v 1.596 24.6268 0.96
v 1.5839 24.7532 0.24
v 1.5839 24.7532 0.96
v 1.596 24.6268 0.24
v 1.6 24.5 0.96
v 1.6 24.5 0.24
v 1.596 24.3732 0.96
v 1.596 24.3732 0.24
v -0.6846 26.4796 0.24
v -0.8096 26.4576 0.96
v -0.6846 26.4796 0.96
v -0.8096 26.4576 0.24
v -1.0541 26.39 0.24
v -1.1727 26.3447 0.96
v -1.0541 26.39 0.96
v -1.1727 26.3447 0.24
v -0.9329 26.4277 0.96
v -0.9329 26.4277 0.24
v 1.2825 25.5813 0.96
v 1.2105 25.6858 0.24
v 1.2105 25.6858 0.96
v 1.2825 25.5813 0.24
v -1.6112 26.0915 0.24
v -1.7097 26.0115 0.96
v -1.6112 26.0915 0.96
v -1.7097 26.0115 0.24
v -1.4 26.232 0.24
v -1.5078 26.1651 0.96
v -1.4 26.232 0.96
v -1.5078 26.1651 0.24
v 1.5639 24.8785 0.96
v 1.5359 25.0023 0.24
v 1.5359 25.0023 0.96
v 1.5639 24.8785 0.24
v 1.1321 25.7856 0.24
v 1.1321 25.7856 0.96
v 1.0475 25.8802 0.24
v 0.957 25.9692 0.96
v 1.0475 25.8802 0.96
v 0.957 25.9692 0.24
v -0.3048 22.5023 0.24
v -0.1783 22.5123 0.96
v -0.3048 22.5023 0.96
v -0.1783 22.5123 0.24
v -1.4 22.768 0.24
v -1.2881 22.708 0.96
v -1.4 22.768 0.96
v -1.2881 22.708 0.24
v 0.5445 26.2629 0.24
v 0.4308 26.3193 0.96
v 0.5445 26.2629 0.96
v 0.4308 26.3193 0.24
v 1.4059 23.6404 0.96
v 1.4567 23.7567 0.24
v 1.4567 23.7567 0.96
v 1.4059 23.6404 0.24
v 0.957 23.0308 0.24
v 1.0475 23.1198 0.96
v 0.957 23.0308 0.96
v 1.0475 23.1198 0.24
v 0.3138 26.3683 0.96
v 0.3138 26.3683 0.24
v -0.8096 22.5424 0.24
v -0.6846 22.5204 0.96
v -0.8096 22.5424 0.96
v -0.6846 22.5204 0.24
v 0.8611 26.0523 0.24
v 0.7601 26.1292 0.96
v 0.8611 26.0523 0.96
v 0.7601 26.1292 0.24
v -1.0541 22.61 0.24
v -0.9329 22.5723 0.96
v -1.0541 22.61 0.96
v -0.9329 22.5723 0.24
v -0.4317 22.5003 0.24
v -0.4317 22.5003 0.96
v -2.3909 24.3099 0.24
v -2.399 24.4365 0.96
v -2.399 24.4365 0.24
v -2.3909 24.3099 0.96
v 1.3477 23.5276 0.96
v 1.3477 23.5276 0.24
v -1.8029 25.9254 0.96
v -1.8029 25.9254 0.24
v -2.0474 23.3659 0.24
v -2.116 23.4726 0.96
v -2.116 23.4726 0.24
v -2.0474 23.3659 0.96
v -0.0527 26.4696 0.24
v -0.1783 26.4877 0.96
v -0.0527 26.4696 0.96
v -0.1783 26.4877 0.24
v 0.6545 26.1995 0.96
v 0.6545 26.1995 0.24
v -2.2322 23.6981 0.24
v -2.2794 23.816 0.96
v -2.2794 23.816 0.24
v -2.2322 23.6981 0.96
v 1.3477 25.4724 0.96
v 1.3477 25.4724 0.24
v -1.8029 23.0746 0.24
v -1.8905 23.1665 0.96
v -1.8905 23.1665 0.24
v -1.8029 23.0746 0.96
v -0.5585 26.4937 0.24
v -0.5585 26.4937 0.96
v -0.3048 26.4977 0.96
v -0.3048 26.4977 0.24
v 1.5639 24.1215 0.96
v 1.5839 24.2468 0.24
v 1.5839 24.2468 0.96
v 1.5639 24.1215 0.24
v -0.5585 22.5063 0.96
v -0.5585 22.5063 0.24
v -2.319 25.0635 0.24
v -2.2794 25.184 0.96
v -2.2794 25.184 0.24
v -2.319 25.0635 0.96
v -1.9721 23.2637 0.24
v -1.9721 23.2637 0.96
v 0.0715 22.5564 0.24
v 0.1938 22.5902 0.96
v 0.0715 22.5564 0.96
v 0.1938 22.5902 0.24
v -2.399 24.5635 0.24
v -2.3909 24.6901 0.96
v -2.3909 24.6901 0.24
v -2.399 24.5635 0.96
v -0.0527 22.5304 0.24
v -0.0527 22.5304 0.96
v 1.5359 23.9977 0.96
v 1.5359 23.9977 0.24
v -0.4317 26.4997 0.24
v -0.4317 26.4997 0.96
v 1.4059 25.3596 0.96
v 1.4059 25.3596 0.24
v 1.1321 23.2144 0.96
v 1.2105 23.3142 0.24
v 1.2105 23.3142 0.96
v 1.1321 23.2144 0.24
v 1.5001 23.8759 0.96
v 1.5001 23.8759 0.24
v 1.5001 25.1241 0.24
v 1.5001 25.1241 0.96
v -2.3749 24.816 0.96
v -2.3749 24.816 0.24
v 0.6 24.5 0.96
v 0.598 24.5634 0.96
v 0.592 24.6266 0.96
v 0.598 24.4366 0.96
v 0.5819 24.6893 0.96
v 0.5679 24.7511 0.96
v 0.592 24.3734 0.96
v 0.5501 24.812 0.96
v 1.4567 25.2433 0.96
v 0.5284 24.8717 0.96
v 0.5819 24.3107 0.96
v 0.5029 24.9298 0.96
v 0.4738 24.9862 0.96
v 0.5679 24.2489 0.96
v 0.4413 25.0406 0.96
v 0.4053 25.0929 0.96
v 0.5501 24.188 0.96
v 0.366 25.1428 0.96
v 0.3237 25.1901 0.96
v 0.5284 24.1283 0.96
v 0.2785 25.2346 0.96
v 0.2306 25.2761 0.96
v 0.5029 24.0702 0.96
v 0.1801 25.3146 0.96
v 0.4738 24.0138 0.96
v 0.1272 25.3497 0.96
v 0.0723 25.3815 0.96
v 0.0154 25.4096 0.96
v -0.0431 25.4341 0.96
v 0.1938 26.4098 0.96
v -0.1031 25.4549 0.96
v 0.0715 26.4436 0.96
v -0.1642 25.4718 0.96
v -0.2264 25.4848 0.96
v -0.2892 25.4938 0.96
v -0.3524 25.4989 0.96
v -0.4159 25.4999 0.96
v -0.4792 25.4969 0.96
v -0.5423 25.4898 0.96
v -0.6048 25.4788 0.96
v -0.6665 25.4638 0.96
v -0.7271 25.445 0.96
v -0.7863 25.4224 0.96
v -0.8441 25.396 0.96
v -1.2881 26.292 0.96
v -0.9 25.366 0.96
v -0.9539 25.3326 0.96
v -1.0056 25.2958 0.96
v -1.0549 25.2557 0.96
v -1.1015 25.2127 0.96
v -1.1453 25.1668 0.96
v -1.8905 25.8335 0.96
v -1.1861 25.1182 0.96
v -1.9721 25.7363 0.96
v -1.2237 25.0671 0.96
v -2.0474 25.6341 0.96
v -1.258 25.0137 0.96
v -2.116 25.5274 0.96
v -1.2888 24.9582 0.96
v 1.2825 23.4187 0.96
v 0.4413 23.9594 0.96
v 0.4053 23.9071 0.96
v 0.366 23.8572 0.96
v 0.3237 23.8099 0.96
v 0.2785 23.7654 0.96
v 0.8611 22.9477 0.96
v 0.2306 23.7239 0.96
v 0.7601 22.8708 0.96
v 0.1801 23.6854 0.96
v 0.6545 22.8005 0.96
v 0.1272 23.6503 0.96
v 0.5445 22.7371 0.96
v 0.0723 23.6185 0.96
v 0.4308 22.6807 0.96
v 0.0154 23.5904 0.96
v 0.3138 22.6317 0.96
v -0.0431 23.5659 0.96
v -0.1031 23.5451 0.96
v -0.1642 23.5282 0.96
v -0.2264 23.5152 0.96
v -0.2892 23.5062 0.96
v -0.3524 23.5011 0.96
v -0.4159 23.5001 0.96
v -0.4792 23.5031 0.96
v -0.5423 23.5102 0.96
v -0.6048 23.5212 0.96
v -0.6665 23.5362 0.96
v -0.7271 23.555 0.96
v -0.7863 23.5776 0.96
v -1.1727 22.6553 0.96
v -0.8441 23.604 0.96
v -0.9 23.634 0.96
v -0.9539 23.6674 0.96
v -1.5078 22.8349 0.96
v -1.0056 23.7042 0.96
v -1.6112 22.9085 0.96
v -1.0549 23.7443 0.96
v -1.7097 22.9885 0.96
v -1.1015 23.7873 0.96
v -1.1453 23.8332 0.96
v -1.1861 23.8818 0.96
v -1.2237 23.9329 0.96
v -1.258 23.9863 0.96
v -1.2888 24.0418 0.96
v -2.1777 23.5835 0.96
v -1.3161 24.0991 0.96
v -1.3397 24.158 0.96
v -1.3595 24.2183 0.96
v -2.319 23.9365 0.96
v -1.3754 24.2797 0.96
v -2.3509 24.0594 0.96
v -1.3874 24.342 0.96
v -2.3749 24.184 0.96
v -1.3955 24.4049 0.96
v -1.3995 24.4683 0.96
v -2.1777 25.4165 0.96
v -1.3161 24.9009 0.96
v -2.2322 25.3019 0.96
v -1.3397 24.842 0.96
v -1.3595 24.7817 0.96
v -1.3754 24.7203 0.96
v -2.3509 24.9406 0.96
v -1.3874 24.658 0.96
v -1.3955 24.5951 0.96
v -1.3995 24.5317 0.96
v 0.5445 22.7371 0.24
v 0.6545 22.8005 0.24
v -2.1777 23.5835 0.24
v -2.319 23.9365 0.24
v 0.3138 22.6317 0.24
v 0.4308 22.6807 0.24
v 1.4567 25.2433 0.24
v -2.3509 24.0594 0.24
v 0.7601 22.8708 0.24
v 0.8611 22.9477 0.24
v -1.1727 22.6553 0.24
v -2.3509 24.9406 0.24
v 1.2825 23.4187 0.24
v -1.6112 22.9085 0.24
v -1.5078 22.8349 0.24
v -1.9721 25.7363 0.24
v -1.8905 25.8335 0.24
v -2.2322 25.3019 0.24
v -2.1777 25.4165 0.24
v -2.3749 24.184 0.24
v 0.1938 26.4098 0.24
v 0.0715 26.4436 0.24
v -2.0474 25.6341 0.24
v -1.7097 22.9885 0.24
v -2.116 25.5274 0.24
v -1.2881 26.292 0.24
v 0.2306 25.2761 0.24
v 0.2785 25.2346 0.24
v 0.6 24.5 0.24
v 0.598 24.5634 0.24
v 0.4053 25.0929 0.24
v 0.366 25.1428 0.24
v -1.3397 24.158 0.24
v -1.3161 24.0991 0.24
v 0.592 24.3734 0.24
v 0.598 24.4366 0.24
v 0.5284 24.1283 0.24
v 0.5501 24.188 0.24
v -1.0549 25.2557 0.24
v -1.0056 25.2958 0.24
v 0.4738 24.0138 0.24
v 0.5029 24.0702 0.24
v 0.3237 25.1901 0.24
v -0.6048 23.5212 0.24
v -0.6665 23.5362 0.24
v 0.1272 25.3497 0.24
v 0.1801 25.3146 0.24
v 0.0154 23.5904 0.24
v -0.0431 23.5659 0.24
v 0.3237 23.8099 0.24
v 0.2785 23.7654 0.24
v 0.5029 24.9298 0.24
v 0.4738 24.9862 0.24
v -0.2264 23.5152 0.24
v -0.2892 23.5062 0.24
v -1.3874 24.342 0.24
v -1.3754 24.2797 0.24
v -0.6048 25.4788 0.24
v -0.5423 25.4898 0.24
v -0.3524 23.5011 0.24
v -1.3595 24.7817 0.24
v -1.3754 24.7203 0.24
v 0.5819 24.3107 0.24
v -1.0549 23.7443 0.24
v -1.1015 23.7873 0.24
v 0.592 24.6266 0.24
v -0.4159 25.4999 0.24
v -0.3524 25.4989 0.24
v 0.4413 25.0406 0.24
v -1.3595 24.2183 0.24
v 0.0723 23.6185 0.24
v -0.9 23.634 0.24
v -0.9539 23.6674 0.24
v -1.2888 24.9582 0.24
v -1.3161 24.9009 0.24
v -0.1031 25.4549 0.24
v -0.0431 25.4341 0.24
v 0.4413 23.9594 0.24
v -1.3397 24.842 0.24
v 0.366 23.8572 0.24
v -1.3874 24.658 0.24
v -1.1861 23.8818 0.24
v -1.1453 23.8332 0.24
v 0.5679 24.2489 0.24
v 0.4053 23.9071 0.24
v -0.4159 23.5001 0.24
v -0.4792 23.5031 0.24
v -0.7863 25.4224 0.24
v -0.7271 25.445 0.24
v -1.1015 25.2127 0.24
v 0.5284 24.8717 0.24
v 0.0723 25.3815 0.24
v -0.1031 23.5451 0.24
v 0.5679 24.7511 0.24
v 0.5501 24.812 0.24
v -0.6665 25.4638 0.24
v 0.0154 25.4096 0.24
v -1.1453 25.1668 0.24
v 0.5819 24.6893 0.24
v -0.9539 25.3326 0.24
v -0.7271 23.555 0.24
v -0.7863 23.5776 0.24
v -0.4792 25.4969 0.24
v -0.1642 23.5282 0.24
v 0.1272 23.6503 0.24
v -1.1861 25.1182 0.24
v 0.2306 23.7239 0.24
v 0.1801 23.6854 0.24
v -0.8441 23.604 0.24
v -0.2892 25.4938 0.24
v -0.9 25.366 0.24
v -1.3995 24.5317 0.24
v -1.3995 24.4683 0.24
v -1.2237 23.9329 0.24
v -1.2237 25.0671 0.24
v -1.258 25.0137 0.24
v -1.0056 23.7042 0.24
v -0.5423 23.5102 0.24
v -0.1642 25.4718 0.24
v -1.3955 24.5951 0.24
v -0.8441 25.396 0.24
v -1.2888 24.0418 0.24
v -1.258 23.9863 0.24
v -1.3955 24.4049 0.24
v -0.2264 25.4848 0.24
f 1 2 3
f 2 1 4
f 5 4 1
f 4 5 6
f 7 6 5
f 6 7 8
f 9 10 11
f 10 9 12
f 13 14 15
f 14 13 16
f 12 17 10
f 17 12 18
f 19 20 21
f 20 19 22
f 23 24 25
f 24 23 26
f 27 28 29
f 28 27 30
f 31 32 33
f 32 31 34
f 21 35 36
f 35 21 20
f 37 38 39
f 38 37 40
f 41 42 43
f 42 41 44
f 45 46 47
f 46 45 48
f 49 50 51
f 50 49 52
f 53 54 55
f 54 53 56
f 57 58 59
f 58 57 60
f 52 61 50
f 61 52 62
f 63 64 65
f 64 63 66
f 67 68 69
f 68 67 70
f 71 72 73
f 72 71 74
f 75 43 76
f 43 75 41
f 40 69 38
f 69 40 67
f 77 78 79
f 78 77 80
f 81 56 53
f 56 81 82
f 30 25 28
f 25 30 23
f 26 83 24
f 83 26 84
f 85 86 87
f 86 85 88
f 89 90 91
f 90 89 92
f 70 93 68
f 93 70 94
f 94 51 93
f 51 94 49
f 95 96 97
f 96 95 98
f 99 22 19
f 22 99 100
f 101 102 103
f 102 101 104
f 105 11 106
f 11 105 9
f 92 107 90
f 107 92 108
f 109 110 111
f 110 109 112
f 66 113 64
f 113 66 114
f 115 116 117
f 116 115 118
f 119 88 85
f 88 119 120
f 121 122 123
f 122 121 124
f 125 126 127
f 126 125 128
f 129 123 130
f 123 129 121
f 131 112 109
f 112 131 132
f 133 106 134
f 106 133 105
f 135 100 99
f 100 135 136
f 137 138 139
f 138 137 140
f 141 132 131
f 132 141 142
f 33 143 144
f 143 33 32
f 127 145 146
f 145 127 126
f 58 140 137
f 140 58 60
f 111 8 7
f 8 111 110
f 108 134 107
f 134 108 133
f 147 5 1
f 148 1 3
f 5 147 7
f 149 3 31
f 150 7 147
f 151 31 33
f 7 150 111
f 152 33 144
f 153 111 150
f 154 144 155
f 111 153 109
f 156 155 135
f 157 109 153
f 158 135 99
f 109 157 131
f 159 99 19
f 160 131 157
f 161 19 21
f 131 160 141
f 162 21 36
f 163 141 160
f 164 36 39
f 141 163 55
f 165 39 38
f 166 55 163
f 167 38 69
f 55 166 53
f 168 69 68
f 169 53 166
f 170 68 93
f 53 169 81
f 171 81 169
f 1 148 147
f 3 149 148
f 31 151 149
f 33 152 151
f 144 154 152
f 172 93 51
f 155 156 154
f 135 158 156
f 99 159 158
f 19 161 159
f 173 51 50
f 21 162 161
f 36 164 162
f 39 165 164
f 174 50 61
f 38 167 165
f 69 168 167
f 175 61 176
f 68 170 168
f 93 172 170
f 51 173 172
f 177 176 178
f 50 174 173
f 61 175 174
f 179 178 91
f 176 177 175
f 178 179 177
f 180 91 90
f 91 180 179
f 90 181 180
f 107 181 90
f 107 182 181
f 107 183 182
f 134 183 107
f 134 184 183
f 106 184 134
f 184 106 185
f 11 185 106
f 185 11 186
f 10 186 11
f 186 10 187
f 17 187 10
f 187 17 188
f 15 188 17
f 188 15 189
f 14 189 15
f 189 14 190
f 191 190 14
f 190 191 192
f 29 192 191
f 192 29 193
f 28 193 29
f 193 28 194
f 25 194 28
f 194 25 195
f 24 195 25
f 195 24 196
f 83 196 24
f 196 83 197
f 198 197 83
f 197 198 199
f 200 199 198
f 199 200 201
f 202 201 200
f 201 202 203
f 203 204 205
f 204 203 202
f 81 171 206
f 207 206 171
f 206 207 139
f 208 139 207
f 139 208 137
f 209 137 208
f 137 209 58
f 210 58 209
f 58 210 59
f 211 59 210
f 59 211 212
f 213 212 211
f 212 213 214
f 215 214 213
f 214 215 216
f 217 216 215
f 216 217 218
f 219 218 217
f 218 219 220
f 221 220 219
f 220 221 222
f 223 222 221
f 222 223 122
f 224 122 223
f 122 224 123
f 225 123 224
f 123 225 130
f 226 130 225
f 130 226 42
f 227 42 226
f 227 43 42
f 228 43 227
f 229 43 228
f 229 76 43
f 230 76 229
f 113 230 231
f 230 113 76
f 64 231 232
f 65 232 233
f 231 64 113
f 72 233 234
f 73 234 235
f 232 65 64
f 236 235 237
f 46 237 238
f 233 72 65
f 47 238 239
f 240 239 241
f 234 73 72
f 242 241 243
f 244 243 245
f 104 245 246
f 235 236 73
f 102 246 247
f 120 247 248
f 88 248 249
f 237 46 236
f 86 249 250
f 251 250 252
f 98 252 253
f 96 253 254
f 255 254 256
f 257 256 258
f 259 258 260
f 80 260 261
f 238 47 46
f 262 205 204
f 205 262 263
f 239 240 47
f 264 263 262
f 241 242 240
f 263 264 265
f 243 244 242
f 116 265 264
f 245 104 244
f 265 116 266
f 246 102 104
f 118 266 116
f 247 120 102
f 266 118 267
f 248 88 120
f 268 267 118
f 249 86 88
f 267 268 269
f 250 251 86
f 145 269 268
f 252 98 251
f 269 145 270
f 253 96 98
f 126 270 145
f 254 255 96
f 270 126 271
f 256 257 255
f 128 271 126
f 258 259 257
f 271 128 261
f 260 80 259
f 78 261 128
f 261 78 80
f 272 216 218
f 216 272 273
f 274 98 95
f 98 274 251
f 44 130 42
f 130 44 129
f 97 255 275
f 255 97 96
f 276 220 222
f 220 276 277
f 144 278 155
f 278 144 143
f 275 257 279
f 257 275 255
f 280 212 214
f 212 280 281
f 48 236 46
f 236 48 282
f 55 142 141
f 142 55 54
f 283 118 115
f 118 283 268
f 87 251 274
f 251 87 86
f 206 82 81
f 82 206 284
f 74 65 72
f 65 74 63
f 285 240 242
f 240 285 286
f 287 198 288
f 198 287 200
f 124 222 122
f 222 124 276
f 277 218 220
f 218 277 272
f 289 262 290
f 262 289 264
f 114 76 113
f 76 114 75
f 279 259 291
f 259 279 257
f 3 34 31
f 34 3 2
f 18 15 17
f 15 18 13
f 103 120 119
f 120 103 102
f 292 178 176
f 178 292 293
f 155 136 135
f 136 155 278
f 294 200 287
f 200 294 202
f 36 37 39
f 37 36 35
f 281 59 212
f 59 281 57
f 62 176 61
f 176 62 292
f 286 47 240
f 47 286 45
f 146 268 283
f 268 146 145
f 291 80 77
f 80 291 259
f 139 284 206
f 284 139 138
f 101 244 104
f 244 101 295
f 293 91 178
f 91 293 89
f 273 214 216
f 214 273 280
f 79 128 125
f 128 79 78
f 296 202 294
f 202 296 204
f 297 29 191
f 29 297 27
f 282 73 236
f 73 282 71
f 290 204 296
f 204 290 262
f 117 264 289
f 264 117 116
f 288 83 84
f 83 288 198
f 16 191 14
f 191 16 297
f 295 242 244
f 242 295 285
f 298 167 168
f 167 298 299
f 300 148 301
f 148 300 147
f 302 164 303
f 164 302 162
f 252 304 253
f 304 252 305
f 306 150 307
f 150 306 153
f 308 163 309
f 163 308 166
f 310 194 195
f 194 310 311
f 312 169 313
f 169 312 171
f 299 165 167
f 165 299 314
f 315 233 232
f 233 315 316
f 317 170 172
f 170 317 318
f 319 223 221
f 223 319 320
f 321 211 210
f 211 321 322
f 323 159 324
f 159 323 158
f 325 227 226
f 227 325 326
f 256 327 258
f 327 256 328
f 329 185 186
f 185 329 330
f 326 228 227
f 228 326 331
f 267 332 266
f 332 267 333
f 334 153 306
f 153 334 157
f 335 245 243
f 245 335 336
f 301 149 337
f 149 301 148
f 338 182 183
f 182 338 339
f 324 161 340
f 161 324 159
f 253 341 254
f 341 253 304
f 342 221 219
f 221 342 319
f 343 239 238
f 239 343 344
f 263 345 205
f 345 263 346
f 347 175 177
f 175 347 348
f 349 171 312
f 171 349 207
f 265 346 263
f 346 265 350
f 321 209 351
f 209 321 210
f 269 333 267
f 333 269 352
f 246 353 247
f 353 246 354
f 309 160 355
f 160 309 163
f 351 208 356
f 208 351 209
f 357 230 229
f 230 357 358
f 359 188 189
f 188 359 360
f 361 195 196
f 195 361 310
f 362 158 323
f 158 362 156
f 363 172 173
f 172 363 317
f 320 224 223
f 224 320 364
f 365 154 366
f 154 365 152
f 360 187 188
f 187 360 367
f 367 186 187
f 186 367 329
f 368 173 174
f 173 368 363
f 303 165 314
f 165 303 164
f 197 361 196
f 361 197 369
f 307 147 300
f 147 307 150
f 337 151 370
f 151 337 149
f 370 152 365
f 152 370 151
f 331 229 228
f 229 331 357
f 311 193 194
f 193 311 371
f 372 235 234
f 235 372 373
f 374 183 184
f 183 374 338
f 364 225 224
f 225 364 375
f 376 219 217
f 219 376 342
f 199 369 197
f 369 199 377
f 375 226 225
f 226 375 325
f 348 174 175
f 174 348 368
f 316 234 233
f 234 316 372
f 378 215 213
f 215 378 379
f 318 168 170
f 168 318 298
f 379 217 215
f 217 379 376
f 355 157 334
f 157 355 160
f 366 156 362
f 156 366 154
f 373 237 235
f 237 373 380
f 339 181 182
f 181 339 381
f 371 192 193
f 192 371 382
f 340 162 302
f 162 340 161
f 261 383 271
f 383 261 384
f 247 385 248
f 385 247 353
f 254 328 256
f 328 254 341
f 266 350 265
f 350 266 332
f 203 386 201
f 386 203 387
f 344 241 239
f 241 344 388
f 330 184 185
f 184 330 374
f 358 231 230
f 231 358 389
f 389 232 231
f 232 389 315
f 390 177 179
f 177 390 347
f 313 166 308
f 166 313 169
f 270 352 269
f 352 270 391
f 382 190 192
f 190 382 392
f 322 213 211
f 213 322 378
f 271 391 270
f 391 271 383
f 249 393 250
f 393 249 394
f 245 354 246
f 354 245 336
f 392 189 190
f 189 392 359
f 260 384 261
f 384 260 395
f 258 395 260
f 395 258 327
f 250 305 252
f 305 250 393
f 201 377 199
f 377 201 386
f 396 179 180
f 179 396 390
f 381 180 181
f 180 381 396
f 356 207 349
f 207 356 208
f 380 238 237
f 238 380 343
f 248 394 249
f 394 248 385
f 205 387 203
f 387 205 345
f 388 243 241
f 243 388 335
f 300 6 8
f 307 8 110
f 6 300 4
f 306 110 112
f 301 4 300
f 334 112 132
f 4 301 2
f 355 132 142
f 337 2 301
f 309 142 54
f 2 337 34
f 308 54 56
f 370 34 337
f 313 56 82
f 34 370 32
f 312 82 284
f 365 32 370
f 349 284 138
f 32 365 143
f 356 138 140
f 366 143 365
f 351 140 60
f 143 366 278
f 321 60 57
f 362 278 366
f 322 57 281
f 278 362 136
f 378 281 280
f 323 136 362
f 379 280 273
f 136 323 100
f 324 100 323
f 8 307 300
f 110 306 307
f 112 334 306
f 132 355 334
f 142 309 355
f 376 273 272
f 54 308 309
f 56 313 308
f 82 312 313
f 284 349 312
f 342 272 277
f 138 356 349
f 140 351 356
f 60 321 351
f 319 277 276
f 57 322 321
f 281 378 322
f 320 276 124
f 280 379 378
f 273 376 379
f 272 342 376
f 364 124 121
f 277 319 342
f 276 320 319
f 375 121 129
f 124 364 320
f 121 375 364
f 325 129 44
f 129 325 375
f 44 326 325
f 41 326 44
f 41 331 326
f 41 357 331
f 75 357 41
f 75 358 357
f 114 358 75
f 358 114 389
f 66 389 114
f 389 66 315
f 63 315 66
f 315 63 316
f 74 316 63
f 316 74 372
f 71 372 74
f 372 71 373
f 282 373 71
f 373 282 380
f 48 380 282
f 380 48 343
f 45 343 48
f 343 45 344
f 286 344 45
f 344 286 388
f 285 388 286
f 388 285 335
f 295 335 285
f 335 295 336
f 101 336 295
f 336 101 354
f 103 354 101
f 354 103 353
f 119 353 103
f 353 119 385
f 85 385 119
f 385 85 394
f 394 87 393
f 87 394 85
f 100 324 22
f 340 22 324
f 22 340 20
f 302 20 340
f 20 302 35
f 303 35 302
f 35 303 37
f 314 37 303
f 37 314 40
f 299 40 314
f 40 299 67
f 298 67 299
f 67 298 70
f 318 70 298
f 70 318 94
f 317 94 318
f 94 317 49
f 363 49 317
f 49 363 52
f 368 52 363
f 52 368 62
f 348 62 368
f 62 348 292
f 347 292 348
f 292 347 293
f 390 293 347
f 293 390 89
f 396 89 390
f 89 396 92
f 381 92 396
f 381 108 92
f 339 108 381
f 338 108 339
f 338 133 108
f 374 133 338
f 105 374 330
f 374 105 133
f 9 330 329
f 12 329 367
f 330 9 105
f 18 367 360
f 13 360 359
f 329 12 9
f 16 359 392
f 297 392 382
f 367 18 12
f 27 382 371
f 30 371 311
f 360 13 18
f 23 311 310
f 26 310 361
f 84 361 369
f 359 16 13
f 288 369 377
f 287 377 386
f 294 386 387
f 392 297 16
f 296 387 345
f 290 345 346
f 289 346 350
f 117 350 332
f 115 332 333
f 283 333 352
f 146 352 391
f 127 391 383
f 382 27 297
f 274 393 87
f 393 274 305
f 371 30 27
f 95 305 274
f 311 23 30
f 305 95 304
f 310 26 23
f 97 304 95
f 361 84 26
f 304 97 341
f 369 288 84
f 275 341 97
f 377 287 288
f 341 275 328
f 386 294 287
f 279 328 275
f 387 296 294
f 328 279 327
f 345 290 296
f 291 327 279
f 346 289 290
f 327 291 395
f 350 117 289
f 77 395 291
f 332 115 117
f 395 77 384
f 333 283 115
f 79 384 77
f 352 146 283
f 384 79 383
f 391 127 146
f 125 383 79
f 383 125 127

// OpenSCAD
//=================================================================================
// DLoveEar.scad
//
//
// Dr Tom Flint, 12 March 2025
//=================================================================================


layer=0.24;
thick=4*layer;
r1=65;
F2=99;

//-----------------------------------------------------------------------------------
module rim(){
  
  render()
  intersection(){
    translate([0,0,-0.3])
    scale([1,1,0.02])
    surface(file="./DLoveEarRim.png", center = true);
  
    translate([0,0,thick/2])
    cube([800,800,thick],center=true);
  }
  
  // hanger loop
    translate([-4,245,0])
    difference(){
      cylinder(r=20,h=thick,$fn=F2);
      cylinder(r=10,h=3*thick,center=true,$fn=F2);
    }
}  

//-----------------------------------------------------------------------------------
module center(){
  
  render()
  intersection(){
    translate([0,0,-0.3])
    scale([1,1,0.02])
    surface(file="./DLoveEarCenter.png", center = true);
    
    translate([0,0,thick/2])
    cube([800,800,thick],center=true);
  }
}  

//-----------------------------------------------------------------------------------
module petals(){
  
  render()
  intersection(){
    translate([0,0,-0.3])
    scale([1,1,0.02])
    surface(file="./DLoveEarPetals.png", center = true);
    
    translate([0,0,thick/2])
    cube([800,800,thick],center=true);
  }
}  

//-----------------------------------------------------------------------------------
module black(){
  
  render()
  intersection(){
    translate([0,0,-0.3])
    scale([1,1,0.02])
    surface(file="./DLoveEarBlack.png", center = true);
    
    translate([0,0,thick/2])
    cube([800,800,thick],center=true);
  }
}  
//-----------------------------------------------------------------------------------
module rimA(){
  
  intersection(){
    rim();
    translate([0,0,layer/2])
    cube([1000,1000,layer],center=true);
  }
}

//-----------------------------------------------------------------------------------
module rimB(){
 
  difference(){
    rim();
    translate([0,0,layer/2])
    cube([1000,1000,layer],center=true);
  }
}
//=================================================================================
scale([0.1,0.1,1]){
//~ black();
//~ petals();
//~ center();
//~ rimA();
rimB();


}

//=================================================================================
